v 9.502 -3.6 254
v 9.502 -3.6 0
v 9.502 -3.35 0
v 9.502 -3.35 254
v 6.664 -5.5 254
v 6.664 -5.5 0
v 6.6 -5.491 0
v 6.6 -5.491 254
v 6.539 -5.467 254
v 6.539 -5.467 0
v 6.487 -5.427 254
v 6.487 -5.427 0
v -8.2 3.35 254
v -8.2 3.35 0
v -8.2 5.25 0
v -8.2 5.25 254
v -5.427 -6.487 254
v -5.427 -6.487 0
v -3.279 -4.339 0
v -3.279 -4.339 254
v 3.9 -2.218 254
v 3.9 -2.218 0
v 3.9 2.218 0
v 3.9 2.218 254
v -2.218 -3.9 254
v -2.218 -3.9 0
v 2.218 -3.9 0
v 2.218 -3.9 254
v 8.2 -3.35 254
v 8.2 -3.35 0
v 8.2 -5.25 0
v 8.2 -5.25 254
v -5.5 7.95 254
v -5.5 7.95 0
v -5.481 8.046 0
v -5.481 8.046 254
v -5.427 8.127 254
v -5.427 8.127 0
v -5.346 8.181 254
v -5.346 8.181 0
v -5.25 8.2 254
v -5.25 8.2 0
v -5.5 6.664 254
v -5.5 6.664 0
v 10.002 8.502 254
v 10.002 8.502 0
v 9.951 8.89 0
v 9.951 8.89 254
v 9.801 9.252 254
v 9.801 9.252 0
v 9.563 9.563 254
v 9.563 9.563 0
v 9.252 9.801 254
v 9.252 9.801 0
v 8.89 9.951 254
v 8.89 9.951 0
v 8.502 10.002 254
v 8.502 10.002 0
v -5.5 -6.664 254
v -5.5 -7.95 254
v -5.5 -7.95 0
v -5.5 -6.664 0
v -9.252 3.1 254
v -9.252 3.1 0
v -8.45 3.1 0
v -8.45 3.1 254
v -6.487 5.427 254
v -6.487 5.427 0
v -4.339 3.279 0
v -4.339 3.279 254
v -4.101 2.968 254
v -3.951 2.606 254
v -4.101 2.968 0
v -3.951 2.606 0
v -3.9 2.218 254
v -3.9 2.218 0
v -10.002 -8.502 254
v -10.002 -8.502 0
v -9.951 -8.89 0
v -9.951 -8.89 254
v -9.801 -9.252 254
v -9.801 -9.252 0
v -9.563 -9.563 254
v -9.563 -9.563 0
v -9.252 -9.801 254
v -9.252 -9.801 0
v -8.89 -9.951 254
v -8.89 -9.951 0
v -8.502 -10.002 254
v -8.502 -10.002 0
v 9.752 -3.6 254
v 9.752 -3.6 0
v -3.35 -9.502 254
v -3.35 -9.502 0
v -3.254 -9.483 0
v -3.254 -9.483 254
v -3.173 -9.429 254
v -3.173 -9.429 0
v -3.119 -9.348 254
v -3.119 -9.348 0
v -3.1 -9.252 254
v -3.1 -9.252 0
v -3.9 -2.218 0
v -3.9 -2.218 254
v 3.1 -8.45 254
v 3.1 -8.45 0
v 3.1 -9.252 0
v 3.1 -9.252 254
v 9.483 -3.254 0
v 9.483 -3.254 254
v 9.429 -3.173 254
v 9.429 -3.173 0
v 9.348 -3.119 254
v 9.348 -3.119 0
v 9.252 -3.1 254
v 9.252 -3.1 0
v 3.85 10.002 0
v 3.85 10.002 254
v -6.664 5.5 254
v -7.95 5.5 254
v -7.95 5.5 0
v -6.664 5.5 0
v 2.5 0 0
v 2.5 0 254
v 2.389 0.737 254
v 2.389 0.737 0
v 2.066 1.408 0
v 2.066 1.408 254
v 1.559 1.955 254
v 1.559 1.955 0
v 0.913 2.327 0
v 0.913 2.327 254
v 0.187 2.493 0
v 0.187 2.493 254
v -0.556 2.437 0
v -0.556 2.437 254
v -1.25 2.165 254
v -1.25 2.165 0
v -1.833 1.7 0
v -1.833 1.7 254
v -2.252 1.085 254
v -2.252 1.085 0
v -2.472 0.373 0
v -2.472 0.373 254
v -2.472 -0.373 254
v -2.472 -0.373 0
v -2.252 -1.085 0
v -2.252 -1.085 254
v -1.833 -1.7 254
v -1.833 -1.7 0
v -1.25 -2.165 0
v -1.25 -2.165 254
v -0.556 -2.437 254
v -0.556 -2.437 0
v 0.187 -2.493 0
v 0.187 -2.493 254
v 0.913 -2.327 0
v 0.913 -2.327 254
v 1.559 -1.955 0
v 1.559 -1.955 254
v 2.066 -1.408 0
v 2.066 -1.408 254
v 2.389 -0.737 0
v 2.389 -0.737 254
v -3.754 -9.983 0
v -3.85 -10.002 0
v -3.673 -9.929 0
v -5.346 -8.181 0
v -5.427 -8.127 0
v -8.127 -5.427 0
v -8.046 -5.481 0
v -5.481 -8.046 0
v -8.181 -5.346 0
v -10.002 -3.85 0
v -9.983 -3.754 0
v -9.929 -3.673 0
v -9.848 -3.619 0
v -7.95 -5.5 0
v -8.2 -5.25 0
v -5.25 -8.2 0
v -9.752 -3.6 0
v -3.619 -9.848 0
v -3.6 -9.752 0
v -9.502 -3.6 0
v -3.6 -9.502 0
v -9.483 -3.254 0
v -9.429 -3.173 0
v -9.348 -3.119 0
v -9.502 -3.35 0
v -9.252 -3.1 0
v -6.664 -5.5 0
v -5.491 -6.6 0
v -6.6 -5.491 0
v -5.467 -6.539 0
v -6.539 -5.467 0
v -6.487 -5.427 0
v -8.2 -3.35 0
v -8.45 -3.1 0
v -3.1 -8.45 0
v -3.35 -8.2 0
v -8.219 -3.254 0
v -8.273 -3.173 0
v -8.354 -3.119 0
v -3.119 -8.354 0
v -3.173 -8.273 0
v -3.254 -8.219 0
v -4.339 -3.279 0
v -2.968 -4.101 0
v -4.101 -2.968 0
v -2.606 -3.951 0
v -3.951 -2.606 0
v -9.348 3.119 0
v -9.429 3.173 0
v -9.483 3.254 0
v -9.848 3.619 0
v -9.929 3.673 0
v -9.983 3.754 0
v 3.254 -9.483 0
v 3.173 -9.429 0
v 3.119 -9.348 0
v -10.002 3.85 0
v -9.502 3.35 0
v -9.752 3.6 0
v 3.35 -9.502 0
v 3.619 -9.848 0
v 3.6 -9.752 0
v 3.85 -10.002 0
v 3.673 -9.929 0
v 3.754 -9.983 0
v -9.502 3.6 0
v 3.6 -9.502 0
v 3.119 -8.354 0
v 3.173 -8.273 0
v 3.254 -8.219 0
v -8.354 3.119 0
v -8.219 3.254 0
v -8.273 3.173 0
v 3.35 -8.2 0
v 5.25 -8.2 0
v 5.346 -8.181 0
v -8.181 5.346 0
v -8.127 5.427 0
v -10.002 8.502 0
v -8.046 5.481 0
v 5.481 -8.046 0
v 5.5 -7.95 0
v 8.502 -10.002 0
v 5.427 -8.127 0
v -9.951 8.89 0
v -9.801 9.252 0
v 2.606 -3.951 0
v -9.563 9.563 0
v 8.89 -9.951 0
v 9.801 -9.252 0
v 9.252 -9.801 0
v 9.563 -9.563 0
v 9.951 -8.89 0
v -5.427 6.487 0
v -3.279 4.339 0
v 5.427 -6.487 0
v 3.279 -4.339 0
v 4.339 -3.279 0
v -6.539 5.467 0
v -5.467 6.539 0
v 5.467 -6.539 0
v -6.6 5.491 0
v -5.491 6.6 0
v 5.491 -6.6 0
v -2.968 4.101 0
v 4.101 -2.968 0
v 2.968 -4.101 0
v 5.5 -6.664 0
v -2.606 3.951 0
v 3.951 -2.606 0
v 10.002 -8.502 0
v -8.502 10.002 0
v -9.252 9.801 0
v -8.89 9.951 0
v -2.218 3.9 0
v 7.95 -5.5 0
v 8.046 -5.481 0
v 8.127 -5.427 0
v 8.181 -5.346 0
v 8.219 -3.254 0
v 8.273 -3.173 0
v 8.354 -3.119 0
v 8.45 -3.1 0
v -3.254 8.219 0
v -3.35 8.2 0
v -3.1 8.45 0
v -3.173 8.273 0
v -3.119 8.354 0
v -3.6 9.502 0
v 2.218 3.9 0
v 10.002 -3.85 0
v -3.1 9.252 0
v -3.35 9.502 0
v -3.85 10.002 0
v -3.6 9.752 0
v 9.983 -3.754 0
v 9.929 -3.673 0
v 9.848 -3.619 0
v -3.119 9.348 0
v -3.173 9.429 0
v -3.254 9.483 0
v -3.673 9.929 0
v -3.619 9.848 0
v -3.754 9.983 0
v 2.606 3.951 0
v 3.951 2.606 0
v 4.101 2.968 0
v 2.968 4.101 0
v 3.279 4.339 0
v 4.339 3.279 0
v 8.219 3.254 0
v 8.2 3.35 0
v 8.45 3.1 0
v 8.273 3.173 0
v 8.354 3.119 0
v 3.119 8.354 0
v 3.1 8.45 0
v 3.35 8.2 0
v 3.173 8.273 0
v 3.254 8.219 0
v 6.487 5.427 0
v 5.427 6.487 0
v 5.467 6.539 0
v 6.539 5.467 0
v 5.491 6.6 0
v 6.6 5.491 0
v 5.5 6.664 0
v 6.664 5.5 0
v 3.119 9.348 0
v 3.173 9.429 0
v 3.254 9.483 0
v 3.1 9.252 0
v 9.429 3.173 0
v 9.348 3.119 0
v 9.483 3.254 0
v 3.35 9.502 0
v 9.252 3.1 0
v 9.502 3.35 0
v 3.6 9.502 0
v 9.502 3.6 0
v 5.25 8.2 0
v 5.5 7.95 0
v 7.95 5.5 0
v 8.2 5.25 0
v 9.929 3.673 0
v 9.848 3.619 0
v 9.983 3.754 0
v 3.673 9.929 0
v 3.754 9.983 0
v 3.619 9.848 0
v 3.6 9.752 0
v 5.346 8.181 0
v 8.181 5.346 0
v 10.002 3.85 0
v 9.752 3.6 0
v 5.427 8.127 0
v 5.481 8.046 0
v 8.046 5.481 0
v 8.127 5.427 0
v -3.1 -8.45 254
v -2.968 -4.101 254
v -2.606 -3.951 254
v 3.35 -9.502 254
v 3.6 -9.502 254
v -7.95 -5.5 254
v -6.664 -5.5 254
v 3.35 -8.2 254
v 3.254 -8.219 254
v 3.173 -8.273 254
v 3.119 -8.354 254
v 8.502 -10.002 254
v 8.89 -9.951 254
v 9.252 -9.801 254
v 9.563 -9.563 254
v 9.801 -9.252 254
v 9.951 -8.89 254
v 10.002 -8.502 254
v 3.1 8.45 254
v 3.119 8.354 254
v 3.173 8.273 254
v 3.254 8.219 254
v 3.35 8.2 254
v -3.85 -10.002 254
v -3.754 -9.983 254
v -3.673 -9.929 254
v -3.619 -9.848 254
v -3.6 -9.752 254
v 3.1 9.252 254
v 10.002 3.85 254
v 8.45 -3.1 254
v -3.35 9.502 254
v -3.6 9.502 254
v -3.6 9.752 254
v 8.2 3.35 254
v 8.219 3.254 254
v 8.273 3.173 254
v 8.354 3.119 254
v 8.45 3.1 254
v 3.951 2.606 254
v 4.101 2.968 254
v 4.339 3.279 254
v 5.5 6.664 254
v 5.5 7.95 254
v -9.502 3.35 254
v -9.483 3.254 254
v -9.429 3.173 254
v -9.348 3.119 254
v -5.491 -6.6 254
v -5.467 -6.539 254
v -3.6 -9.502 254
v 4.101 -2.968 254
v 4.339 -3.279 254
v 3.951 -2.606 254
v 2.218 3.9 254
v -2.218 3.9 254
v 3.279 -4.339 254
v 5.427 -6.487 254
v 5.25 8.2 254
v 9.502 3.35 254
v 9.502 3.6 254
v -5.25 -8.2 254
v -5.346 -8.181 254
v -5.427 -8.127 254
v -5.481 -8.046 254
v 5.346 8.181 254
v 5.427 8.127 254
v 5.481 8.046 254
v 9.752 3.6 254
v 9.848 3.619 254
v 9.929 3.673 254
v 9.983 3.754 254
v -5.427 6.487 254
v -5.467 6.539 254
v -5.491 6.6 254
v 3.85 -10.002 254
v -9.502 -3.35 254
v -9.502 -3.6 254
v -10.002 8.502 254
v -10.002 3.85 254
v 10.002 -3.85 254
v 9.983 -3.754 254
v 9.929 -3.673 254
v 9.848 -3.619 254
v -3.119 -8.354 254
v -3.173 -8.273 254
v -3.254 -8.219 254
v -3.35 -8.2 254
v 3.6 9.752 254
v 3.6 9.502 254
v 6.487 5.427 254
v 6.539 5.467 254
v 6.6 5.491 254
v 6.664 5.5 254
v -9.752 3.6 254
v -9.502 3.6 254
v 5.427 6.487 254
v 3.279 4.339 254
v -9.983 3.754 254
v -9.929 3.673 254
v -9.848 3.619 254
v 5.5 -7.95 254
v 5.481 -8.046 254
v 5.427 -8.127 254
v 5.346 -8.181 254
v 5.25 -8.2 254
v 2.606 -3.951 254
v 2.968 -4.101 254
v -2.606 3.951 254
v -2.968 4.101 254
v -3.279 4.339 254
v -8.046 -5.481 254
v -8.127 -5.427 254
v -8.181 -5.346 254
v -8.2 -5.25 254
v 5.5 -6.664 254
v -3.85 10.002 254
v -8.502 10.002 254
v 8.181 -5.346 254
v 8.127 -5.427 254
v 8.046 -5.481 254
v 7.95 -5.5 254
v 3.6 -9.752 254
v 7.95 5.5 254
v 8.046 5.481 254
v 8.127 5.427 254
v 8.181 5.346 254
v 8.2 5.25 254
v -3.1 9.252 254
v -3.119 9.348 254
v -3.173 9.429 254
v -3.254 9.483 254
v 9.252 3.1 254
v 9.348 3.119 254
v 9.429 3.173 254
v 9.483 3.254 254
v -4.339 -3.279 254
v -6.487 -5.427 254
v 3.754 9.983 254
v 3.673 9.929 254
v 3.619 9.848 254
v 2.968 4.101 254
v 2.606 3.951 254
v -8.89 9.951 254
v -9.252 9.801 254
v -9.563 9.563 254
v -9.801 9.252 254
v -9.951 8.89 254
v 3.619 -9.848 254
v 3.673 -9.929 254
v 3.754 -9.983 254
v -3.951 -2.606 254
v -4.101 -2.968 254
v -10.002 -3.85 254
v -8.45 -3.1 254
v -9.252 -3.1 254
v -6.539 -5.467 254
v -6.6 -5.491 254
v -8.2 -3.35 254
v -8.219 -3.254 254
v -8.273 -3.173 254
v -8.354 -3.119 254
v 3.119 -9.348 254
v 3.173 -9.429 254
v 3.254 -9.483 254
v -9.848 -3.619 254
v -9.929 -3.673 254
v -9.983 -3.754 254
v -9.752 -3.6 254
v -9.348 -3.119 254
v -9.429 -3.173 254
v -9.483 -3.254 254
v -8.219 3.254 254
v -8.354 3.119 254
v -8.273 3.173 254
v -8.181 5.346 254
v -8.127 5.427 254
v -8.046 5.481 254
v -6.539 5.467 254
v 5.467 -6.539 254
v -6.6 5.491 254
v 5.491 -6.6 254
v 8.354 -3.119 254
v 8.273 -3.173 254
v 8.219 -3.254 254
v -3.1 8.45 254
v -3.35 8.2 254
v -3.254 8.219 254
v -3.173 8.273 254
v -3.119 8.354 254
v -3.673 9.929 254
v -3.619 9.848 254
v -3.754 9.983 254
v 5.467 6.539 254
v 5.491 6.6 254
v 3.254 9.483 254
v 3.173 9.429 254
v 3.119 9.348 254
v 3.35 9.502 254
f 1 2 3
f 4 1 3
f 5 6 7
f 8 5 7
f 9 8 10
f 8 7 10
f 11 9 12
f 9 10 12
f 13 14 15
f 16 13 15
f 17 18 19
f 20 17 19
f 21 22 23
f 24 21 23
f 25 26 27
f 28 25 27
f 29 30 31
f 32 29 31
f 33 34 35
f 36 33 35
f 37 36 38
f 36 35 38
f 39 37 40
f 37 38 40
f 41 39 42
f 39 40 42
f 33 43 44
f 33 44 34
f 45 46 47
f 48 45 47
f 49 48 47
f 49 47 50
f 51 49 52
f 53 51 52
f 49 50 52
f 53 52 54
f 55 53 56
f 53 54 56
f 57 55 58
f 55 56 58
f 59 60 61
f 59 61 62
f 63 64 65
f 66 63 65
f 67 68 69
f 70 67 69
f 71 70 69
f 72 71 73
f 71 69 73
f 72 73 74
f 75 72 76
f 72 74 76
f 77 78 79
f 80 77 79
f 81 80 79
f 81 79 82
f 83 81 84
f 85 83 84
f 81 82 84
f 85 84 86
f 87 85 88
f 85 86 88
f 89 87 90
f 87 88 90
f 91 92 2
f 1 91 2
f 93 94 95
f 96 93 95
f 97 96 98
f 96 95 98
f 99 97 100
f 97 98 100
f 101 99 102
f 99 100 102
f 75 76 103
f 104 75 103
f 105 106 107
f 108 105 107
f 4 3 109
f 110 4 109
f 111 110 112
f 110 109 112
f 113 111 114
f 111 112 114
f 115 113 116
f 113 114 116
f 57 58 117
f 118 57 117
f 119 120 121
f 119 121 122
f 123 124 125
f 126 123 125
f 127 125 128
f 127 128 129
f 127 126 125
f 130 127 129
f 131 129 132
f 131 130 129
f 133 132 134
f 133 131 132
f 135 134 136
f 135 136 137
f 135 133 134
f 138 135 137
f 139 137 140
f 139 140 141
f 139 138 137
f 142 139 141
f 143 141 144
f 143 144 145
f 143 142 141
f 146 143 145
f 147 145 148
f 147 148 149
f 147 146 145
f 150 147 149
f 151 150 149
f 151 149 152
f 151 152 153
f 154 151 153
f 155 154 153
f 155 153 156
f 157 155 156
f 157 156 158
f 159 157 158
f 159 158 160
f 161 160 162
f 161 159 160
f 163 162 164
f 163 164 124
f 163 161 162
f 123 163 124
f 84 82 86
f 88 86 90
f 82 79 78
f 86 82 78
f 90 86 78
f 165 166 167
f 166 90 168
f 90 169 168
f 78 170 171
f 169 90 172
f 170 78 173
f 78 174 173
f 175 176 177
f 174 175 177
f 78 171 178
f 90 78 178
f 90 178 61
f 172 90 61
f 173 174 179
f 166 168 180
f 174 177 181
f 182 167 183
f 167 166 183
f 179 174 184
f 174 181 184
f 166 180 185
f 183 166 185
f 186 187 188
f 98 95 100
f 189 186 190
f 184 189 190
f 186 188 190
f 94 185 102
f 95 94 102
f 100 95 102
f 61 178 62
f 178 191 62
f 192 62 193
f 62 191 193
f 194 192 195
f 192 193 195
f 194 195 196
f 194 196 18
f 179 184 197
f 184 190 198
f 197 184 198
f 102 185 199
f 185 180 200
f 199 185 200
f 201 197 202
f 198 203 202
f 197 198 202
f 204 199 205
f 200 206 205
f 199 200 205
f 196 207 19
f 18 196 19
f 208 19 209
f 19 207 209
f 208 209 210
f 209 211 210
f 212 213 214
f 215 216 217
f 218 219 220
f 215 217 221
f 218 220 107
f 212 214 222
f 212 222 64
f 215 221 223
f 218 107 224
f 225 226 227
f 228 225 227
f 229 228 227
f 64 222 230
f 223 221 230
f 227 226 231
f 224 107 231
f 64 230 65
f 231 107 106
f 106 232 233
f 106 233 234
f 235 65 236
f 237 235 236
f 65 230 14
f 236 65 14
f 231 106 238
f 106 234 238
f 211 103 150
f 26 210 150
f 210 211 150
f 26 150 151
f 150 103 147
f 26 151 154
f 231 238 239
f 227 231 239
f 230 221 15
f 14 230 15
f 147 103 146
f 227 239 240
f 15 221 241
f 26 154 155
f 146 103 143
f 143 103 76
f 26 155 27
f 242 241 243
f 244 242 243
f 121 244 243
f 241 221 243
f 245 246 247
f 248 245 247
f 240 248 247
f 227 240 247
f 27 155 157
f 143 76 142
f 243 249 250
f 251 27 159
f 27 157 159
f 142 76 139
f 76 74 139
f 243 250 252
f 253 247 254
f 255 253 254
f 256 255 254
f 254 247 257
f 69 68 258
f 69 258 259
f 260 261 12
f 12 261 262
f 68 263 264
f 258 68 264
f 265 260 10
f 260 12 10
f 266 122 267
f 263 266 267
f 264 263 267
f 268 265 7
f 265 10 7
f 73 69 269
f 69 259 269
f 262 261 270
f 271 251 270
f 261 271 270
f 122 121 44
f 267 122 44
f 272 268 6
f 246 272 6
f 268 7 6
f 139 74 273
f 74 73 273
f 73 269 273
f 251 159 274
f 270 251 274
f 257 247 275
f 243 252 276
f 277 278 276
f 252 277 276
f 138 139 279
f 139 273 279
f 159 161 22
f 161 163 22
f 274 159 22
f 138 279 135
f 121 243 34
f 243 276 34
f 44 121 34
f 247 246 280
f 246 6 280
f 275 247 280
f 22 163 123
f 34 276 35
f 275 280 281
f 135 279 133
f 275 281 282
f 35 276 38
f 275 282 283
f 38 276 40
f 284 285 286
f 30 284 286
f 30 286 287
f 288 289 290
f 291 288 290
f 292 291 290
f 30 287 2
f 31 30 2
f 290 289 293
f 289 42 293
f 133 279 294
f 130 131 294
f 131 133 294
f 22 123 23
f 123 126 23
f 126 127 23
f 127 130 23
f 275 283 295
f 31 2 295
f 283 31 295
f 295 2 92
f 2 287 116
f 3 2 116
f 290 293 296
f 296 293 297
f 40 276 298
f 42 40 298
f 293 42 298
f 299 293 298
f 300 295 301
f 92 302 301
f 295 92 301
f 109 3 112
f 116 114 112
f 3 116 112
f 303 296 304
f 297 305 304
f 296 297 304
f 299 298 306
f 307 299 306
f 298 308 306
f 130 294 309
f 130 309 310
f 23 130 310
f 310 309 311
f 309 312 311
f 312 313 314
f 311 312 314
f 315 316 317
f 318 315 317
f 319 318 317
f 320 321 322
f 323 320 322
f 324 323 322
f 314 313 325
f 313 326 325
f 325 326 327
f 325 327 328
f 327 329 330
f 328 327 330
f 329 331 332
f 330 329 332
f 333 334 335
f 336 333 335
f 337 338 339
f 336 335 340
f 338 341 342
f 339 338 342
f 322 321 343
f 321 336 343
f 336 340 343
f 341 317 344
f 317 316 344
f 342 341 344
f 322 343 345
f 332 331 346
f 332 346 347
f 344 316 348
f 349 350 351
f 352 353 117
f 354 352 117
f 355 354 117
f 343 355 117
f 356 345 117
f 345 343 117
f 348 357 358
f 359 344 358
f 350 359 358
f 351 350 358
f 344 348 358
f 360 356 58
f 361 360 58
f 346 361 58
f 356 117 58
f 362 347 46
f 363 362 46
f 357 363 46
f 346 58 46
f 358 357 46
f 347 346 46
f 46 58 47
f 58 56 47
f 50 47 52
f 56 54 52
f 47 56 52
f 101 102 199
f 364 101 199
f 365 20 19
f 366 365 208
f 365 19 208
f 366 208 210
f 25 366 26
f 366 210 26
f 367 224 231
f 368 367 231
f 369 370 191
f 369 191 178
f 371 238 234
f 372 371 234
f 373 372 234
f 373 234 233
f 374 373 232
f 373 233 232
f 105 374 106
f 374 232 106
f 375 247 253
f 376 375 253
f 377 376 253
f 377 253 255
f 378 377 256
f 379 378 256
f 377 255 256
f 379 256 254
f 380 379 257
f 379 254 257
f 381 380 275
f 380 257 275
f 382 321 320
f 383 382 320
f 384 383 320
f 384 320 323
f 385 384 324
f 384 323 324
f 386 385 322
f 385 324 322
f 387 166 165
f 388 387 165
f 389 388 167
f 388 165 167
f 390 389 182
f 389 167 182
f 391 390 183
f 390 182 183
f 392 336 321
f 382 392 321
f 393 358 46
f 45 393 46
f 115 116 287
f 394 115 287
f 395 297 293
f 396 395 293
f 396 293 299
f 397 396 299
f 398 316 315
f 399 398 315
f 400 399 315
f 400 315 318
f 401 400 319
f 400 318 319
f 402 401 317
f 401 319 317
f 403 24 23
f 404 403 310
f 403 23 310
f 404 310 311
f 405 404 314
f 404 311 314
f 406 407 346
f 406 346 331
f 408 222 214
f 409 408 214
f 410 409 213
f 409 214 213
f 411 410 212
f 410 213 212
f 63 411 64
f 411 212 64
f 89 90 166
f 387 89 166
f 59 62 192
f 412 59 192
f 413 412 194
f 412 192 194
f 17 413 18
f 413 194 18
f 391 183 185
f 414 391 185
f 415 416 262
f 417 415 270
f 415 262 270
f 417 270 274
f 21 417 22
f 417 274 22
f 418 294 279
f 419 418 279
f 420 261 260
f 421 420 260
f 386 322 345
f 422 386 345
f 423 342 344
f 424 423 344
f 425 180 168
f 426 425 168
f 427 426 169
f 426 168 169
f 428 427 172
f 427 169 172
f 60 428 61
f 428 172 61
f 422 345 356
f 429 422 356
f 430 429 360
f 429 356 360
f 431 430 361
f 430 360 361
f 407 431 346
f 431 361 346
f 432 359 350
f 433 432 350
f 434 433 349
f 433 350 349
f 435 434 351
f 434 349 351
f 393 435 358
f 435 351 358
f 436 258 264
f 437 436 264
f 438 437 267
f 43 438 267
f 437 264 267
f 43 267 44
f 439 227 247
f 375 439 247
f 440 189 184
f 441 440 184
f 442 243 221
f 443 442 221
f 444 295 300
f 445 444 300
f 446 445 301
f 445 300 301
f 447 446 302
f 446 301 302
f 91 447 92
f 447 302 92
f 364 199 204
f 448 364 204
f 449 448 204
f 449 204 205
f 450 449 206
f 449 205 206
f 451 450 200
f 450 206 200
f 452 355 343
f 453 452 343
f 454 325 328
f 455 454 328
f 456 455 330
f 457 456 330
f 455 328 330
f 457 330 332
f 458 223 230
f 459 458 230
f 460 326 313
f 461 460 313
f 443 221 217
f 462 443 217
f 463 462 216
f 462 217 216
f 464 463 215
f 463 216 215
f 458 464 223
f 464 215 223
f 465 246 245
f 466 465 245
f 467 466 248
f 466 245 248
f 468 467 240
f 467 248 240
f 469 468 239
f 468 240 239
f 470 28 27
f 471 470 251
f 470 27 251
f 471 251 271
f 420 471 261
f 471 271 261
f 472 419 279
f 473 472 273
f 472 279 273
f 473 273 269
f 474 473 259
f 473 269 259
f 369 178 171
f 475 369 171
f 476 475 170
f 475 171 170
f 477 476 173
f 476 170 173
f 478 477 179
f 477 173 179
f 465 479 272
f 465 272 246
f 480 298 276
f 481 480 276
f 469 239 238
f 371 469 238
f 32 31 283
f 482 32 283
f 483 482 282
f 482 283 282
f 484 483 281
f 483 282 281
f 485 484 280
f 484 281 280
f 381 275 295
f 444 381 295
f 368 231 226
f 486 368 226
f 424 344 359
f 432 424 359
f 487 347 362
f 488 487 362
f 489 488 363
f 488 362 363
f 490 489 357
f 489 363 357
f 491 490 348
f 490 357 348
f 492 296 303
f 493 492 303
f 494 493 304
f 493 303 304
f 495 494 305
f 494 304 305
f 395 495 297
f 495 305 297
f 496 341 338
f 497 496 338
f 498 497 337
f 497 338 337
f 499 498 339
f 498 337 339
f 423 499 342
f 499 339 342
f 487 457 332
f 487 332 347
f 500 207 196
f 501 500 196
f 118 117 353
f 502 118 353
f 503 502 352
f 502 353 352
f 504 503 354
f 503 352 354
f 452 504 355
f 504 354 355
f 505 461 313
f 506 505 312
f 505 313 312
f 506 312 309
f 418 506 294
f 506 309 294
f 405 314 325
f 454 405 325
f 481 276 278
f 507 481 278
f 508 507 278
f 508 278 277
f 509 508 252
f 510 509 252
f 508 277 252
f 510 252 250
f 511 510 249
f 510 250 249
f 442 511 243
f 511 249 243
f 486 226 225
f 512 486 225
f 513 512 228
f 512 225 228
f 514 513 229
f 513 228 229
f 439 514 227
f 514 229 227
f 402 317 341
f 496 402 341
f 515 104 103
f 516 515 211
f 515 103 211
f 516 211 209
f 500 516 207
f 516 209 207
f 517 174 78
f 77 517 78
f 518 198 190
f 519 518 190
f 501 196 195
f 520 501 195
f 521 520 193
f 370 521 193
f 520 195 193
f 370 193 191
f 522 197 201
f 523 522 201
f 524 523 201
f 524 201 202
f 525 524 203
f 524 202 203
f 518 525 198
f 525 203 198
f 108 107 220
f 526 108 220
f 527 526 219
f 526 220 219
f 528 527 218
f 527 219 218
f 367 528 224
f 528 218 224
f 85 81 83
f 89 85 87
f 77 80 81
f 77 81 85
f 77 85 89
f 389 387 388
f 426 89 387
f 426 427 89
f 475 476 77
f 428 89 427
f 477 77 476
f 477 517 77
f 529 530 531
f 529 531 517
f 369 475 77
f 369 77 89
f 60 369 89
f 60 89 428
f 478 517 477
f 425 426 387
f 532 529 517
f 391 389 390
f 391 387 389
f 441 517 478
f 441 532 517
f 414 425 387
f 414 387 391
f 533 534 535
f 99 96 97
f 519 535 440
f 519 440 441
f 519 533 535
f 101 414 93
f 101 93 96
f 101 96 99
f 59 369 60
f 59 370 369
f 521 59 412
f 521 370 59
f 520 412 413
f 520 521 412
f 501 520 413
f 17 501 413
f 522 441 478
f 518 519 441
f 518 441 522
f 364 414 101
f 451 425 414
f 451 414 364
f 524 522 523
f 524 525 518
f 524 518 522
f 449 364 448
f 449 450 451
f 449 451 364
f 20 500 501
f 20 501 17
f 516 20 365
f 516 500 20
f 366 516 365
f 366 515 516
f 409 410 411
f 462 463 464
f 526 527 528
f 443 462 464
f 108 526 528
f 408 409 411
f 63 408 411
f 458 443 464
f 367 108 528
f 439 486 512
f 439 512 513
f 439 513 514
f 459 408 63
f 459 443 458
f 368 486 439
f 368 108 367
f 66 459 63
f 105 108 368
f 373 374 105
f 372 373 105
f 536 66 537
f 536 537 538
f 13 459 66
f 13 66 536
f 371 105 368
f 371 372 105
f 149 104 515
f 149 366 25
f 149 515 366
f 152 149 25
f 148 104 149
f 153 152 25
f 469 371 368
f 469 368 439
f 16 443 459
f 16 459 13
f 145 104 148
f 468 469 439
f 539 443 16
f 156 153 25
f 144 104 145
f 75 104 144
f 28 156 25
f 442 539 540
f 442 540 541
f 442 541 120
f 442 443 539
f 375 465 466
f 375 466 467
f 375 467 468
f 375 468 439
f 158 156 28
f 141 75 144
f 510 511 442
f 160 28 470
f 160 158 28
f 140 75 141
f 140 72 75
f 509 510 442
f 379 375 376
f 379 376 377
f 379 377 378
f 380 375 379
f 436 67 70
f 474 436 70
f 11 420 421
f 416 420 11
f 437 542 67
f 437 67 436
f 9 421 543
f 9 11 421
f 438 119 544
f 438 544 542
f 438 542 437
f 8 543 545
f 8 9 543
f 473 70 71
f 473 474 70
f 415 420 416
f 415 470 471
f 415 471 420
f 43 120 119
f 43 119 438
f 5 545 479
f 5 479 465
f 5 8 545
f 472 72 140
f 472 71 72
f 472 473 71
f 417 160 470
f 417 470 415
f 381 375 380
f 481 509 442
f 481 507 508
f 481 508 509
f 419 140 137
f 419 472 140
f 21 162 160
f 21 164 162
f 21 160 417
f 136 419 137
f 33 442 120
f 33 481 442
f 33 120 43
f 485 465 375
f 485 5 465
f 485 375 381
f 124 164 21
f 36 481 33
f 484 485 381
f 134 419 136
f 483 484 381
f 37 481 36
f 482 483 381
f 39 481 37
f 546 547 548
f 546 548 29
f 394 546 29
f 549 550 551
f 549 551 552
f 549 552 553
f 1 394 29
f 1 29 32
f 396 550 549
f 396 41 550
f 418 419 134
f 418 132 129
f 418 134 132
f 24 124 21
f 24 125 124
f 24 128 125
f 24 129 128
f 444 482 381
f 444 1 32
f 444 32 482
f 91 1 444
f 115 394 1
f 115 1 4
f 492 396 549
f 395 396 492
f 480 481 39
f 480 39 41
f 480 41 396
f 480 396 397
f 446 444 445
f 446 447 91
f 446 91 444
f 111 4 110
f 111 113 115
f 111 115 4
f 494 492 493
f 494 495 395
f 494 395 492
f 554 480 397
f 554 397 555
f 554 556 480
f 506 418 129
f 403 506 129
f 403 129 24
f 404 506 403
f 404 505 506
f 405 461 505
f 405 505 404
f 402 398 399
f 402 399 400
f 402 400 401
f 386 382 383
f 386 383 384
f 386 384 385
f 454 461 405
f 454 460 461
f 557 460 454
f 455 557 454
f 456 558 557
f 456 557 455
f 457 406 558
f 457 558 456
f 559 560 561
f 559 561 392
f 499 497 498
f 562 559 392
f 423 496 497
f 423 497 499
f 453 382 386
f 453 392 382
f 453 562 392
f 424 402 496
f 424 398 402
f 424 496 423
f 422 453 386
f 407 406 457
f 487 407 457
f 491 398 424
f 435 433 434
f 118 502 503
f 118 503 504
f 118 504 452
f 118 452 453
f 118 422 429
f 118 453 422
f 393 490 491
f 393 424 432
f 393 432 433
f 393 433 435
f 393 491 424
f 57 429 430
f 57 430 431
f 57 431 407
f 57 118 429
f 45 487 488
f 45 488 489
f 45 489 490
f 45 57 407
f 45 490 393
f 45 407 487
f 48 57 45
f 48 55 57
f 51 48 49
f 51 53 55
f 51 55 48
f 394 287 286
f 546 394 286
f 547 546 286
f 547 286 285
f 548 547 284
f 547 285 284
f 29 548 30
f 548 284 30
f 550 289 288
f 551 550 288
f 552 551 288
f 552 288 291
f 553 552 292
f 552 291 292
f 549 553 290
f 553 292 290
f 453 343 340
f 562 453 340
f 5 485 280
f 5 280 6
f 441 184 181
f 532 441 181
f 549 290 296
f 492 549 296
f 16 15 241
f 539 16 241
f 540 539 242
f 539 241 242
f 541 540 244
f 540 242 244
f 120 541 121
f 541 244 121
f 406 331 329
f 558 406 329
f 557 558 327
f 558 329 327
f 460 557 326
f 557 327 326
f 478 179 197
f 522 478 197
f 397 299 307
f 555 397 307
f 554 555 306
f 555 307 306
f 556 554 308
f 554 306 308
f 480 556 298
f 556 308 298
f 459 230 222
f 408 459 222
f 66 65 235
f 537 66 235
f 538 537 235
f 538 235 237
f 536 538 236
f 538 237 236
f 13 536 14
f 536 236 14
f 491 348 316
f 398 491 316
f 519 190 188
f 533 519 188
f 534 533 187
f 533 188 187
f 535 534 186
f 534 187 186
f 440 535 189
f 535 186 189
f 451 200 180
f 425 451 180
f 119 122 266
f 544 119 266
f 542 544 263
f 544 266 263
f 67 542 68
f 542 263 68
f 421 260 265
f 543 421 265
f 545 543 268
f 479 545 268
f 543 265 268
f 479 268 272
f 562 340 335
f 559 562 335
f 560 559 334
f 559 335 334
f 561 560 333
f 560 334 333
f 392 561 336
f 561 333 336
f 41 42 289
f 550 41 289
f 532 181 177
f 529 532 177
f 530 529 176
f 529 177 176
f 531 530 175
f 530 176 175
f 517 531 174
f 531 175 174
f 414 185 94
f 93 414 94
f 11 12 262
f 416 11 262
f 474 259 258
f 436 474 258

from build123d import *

# Parameters (mm, degrees)
SKETCH_1_R      = 2.5
EXTRUDE_1_DEPTH = 254


with BuildPart() as part:
    # 草图1 → 凸台-拉伸1 (new body)
    with BuildSketch(Plane.XY):
        with BuildLine():
            Line((-8.502261885, -10.002261885), (-3.85, -10.002261885))
            ThreePointArc((-3.85, -10.002261885), (-3.673223305, -9.929038581), (-3.6, -9.752261885))
            Line((-3.6, -9.752261885), (-3.6, -9.502261885))
            Line((-3.6, -9.502261885), (-3.35, -9.502261885))
            ThreePointArc((-3.35, -9.502261885), (-3.173223305, -9.429038581), (-3.1, -9.252261885))
            Line((-3.1, -9.252261885), (-3.1, -8.45))
            ThreePointArc((-3.1, -8.45), (-3.173223305, -8.273223305), (-3.35, -8.2))
            Line((-3.35, -8.2), (-5.25, -8.2))
            ThreePointArc((-5.25, -8.2), (-5.426776695, -8.126776695), (-5.5, -7.95))
            Line((-5.5, -7.95), (-5.5, -6.664213562))
            ThreePointArc((-5.5, -6.664213562), (-5.480969883, -6.568542704), (-5.426776695, -6.487436867))
            Line((-5.426776695, -6.487436867), (-3.278679656, -4.339339828))
            ThreePointArc((-3.278679656, -4.339339828), (-2.792044633, -4.014180701), (-2.218019485, -3.9))
            Line((-2.218019485, -3.9), (2.218019485, -3.9))
            ThreePointArc((2.218019485, -3.9), (2.792044633, -4.014180701), (3.278679656, -4.339339828))
            Line((3.278679656, -4.339339828), (5.426776695, -6.487436867))
            ThreePointArc((5.426776695, -6.487436867), (5.480969883, -6.568542704), (5.5, -6.664213562))
            Line((5.5, -6.664213562), (5.5, -7.95))
            ThreePointArc((5.5, -7.95), (5.426776695, -8.126776695), (5.25, -8.2))
            Line((5.25, -8.2), (3.35, -8.2))
            ThreePointArc((3.35, -8.2), (3.173223305, -8.273223305), (3.1, -8.45))
            Line((3.1, -8.45), (3.1, -9.252261885))
            ThreePointArc((3.1, -9.252261885), (3.173223305, -9.429038581), (3.35, -9.502261885))
            Line((3.35, -9.502261885), (3.6, -9.502261885))
            Line((3.6, -9.502261885), (3.6, -9.752261885))
            ThreePointArc((3.6, -9.752261885), (3.673223305, -9.929038581), (3.85, -10.002261885))
            Line((3.85, -10.002261885), (8.502261885, -10.002261885))
            ThreePointArc((8.502261885, -10.002261885), (9.562922057, -9.562922057), (10.002261885, -8.502261885))
            Line((10.002261885, -8.502261885), (10.002261885, -3.85))
            ThreePointArc((10.002261885, -3.85), (9.929038581, -3.673223305), (9.752261885, -3.6))
            Line((9.752261885, -3.6), (9.502261885, -3.6))
            Line((9.502261885, -3.6), (9.502261885, -3.35))
            ThreePointArc((9.502261885, -3.35), (9.429038581, -3.173223305), (9.252261885, -3.1))
            Line((9.252261885, -3.1), (8.45, -3.1))
            ThreePointArc((8.45, -3.1), (8.273223305, -3.173223305), (8.2, -3.35))
            Line((8.2, -3.35), (8.2, -5.25))
            ThreePointArc((8.2, -5.25), (8.126776695, -5.426776695), (7.95, -5.5))
            Line((7.95, -5.5), (6.664213562, -5.5))
            ThreePointArc((6.664213562, -5.5), (6.568542704, -5.480969883), (6.487436867, -5.426776695))
            Line((6.487436867, -5.426776695), (4.339339828, -3.278679656))
            ThreePointArc((4.339339828, -3.278679656), (4.014180701, -2.792044633), (3.9, -2.218019485))
            Line((3.9, -2.218019485), (3.9, 2.218019485))
            ThreePointArc((3.9, 2.218019485), (4.014180701, 2.792044633), (4.339339828, 3.278679656))
            Line((4.339339828, 3.278679656), (6.487436867, 5.426776695))
            ThreePointArc((6.487436867, 5.426776695), (6.568542704, 5.480969883), (6.664213562, 5.5))
            Line((6.664213562, 5.5), (7.95, 5.5))
            ThreePointArc((7.95, 5.5), (8.126776695, 5.426776695), (8.2, 5.25))
            Line((8.2, 5.25), (8.2, 3.35))
            ThreePointArc((8.2, 3.35), (8.273223305, 3.173223305), (8.45, 3.1))
            Line((8.45, 3.1), (9.252261885, 3.1))
            ThreePointArc((9.252261885, 3.1), (9.429038581, 3.173223305), (9.502261885, 3.35))
            Line((9.502261885, 3.35), (9.502261885, 3.6))
            Line((9.502261885, 3.6), (9.752261885, 3.6))
            ThreePointArc((9.752261885, 3.6), (9.929038581, 3.673223305), (10.002261885, 3.85))
            Line((10.002261885, 3.85), (10.002261885, 8.502261885))
            ThreePointArc((10.002261885, 8.502261885), (9.562922057, 9.562922057), (8.502261885, 10.002261885))
            Line((8.502261885, 10.002261885), (3.85, 10.002261885))
            ThreePointArc((3.85, 10.002261885), (3.673223305, 9.929038581), (3.6, 9.752261885))
            Line((3.6, 9.752261885), (3.6, 9.502261885))
            Line((3.6, 9.502261885), (3.35, 9.502261885))
            ThreePointArc((3.35, 9.502261885), (3.173223305, 9.429038581), (3.1, 9.252261885))
            Line((3.1, 9.252261885), (3.1, 8.45))
            ThreePointArc((3.1, 8.45), (3.173223305, 8.273223305), (3.35, 8.2))
            Line((3.35, 8.2), (5.25, 8.2))
            ThreePointArc((5.25, 8.2), (5.426776695, 8.126776695), (5.5, 7.95))
            Line((5.5, 7.95), (5.5, 6.664213562))
            ThreePointArc((5.5, 6.664213562), (5.480969883, 6.568542704), (5.426776695, 6.487436867))
            Line((5.426776695, 6.487436867), (3.278679656, 4.339339828))
            ThreePointArc((3.278679656, 4.339339828), (2.792044633, 4.014180701), (2.218019485, 3.9))
            Line((2.218019485, 3.9), (-2.218019485, 3.9))
            ThreePointArc((-2.218019485, 3.9), (-2.792044633, 4.014180701), (-3.278679656, 4.339339828))
            Line((-3.278679656, 4.339339828), (-5.426776695, 6.487436867))
            ThreePointArc((-5.426776695, 6.487436867), (-5.480969883, 6.568542704), (-5.5, 6.664213562))
            Line((-5.5, 6.664213562), (-5.5, 7.95))
            ThreePointArc((-5.5, 7.95), (-5.426776695, 8.126776695), (-5.25, 8.2))
            Line((-5.25, 8.2), (-3.35, 8.2))
            ThreePointArc((-3.35, 8.2), (-3.173223305, 8.273223305), (-3.1, 8.45))
            Line((-3.1, 8.45), (-3.1, 9.252261885))
            ThreePointArc((-3.1, 9.252261885), (-3.173223305, 9.429038581), (-3.35, 9.502261885))
            Line((-3.35, 9.502261885), (-3.6, 9.502261885))
            Line((-3.6, 9.502261885), (-3.6, 9.752261885))
            ThreePointArc((-3.6, 9.752261885), (-3.673223305, 9.929038581), (-3.85, 10.002261885))
            Line((-3.85, 10.002261885), (-8.502261885, 10.002261885))
            ThreePointArc((-8.502261885, 10.002261885), (-9.562922057, 9.562922057), (-10.002261885, 8.502261885))
            Line((-10.002261885, 8.502261885), (-10.002261885, 3.85))
            ThreePointArc((-10.002261885, 3.85), (-9.929038581, 3.673223305), (-9.752261885, 3.6))
            Line((-9.752261885, 3.6), (-9.502261885, 3.6))
            Line((-9.502261885, 3.6), (-9.502261885, 3.35))
            ThreePointArc((-9.502261885, 3.35), (-9.429038581, 3.173223305), (-9.252261885, 3.1))
            Line((-9.252261885, 3.1), (-8.45, 3.1))
            ThreePointArc((-8.45, 3.1), (-8.273223305, 3.173223305), (-8.2, 3.35))
            Line((-8.2, 3.35), (-8.2, 5.25))
            ThreePointArc((-8.2, 5.25), (-8.126776695, 5.426776695), (-7.95, 5.5))
            Line((-7.95, 5.5), (-6.664213562, 5.5))
            ThreePointArc((-6.664213562, 5.5), (-6.568542704, 5.480969883), (-6.487436867, 5.426776695))
            Line((-6.487436867, 5.426776695), (-4.339339828, 3.278679656))
            ThreePointArc((-4.339339828, 3.278679656), (-4.014180701, 2.792044633), (-3.9, 2.218019485))
            Line((-3.9, 2.218019485), (-3.9, -2.218019485))
            ThreePointArc((-3.9, -2.218019485), (-4.014180701, -2.792044633), (-4.339339828, -3.278679656))
            Line((-4.339339828, -3.278679656), (-6.487436867, -5.426776695))
            ThreePointArc((-6.487436867, -5.426776695), (-6.568542704, -5.480969883), (-6.664213562, -5.5))
            Line((-6.664213562, -5.5), (-7.95, -5.5))
            ThreePointArc((-7.95, -5.5), (-8.126776695, -5.426776695), (-8.2, -5.25))
            Line((-8.2, -5.25), (-8.2, -3.35))
            ThreePointArc((-8.2, -3.35), (-8.273223305, -3.173223305), (-8.45, -3.1))
            Line((-8.45, -3.1), (-9.252261885, -3.1))
            ThreePointArc((-9.252261885, -3.1), (-9.429038581, -3.173223305), (-9.502261885, -3.35))
            Line((-9.502261885, -3.35), (-9.502261885, -3.6))
            Line((-9.502261885, -3.6), (-9.752261885, -3.6))
            ThreePointArc((-9.752261885, -3.6), (-9.929038581, -3.673223305), (-10.002261885, -3.85))
            Line((-10.002261885, -3.85), (-10.002261885, -8.502261885))
            ThreePointArc((-10.002261885, -8.502261885), (-9.562922057, -9.562922057), (-8.502261885, -10.002261885))
        make_face()
        Circle(SKETCH_1_R, mode=Mode.SUBTRACT)
    extrude(amount=EXTRUDE_1_DEPTH)


solid = part.part
